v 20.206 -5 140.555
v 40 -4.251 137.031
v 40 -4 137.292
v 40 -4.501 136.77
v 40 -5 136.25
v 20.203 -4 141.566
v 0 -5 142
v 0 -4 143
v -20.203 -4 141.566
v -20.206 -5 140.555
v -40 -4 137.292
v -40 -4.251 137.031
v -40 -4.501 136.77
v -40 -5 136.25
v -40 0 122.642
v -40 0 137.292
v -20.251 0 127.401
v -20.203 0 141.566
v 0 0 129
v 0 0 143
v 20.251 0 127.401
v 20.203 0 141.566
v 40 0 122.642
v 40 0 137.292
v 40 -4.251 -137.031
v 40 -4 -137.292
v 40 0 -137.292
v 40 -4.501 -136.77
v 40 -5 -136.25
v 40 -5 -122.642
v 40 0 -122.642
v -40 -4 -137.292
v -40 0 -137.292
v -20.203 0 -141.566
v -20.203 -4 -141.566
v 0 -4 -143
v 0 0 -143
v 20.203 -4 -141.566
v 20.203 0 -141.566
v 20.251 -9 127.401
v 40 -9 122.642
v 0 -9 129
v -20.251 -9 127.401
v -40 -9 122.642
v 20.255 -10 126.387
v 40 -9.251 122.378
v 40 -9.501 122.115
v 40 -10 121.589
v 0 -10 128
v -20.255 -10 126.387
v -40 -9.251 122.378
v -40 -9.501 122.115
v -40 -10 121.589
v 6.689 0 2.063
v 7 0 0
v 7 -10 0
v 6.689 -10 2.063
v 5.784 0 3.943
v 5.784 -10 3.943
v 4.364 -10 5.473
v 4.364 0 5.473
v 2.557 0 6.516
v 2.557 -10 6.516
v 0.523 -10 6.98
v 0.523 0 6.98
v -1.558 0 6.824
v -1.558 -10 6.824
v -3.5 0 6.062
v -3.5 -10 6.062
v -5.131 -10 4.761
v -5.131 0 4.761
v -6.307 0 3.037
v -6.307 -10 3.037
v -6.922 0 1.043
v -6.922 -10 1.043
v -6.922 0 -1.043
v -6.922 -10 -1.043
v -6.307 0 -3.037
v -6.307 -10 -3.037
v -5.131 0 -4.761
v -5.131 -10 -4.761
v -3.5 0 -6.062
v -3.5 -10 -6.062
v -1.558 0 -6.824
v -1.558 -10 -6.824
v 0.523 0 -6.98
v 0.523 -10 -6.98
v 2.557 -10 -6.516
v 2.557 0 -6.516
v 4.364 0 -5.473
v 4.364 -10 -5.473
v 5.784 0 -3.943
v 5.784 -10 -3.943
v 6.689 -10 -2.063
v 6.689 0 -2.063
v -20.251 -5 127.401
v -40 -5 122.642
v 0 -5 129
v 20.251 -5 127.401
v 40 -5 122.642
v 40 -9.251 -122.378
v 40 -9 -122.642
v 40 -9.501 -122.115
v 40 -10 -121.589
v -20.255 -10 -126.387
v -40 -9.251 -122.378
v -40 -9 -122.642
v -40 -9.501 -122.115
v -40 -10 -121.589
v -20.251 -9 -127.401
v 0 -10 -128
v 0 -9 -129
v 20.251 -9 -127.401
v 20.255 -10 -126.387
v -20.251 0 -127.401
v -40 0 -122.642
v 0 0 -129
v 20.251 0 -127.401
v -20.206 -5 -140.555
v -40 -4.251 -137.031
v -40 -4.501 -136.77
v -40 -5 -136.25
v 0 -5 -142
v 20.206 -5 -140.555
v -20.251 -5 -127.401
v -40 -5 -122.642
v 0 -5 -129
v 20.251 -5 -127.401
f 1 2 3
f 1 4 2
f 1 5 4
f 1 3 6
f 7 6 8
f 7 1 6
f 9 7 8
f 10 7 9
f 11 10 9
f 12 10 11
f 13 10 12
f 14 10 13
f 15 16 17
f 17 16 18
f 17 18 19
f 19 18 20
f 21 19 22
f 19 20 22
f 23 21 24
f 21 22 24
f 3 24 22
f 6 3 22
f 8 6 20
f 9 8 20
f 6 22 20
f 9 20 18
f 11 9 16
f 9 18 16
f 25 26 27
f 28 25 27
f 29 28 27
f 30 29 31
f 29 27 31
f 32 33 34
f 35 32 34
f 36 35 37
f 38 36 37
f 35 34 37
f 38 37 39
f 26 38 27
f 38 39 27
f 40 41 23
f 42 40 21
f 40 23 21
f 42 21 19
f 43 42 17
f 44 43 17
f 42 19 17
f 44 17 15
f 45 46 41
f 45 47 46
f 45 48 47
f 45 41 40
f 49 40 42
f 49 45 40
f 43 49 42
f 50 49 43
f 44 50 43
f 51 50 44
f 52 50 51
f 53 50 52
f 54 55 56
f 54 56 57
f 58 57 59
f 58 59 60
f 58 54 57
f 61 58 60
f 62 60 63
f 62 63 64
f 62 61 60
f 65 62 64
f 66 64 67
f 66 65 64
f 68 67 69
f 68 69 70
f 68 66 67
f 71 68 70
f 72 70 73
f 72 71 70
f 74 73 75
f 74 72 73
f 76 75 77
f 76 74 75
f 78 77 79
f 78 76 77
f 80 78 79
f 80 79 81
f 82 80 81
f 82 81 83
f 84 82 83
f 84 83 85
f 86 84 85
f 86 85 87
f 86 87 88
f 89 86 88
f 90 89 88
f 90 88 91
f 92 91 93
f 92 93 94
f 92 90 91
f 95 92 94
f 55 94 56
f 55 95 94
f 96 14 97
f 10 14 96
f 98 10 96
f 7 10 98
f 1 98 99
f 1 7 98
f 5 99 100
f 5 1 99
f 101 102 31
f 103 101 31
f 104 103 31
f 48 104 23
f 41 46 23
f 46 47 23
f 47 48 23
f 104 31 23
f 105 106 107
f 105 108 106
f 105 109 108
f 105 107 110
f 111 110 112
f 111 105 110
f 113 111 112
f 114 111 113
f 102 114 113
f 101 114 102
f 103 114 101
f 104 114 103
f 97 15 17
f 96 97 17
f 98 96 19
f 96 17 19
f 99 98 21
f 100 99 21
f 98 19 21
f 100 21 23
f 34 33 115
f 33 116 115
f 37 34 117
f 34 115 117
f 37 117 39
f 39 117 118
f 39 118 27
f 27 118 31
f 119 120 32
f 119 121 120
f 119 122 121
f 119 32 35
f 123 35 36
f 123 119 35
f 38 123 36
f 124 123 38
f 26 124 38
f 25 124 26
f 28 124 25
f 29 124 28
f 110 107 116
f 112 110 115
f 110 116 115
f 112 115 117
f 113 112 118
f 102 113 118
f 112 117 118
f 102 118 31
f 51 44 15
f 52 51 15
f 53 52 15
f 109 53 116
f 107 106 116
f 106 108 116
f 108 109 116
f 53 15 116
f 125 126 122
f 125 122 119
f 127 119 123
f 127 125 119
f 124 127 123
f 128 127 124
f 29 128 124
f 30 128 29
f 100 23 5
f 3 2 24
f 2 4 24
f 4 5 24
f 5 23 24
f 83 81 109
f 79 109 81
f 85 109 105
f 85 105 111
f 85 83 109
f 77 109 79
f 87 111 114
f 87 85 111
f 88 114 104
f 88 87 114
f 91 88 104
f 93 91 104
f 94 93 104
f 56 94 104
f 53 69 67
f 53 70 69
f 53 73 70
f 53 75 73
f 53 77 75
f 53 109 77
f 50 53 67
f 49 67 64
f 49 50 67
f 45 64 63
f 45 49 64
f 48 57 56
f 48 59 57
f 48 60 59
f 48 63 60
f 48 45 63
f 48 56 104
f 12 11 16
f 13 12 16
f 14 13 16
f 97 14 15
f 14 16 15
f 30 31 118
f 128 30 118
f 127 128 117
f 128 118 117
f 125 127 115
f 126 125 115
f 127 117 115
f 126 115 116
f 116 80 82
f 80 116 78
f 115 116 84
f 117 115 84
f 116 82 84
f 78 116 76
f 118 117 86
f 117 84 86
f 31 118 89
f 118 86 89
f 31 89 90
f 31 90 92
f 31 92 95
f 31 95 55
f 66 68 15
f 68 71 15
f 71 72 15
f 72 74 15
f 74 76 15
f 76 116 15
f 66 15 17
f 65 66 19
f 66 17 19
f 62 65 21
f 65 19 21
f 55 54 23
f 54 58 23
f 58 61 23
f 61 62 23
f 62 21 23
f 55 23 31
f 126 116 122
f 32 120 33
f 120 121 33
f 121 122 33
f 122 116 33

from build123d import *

# Parameters (mm, degrees)
F1_DEPTH  = 5
F0_R      = 7
F2_DEPTH  = 10
F3_SIZE   = 1
F3_2_SIZE = 1
F3_3_SIZE = 1


with BuildPart() as f1:
    # F0 (on Front) → F1 (new body)
    with BuildSketch(Plane.XZ):
        with BuildLine():
            ThreePointArc((-40, -137.291660344), (0, -143), (40, -137.291660344))
            Line((40, -137.291660344), (40, -122.6417547167))
            ThreePointArc((40, -122.6417547167), (0, -129), (-40, -122.6417547167))
            Line((-40, -122.6417547167), (-40, -137.291660344))
        make_face()
    extrude(amount=F1_DEPTH)

    # F3
    f3_edges = [f1.edges().sort_by_distance(p)[0] for p in [
        (0, -5, -143),
    ]]
    chamfer(f3_edges, length=F3_SIZE)


with BuildPart() as f1b:
    # F0 (on Front) → F1, piece 2 (new body)
    with BuildSketch(Plane.XZ):
        with BuildLine():
            Line((40, 122.6417547167), (40, 137.291660344))
            ThreePointArc((40, 137.291660344), (0, 143), (-40, 137.291660344))
            Line((-40, 137.291660344), (-40, 122.6417547167))
            ThreePointArc((-40, 122.6417547167), (0, 129), (40, 122.6417547167))
        make_face()
    extrude(amount=F1_DEPTH)

    # F3#3
    f3_3_edges = [f1b.edges().sort_by_distance(p)[0] for p in [
        (0, -5, 143),
    ]]
    chamfer(f3_3_edges, length=F3_3_SIZE)


with BuildPart() as f2:
    # F0 (on Front) → F2 (new body)
    with BuildSketch(Plane.XZ):
        with BuildLine():
            Line((40, -122.6417547167), (40, 122.6417547167))
            ThreePointArc((40, 122.6417547167), (0, 129), (-40, 122.6417547167))
            Line((-40, 122.6417547167), (-40, -122.6417547167))
            ThreePointArc((-40, -122.6417547167), (0, -129), (40, -122.6417547167))
        make_face()
        Circle(F0_R, mode=Mode.SUBTRACT)
    extrude(amount=F2_DEPTH)

    # F3#2
    f3_2_edges = [f2.edges().sort_by_distance(p)[0] for p in [
        (0, -10, -129),
        (0, -10, 129),
    ]]
    chamfer(f3_2_edges, length=F3_2_SIZE)


solid = Compound([f1.part, f1b.part, f2.part])
